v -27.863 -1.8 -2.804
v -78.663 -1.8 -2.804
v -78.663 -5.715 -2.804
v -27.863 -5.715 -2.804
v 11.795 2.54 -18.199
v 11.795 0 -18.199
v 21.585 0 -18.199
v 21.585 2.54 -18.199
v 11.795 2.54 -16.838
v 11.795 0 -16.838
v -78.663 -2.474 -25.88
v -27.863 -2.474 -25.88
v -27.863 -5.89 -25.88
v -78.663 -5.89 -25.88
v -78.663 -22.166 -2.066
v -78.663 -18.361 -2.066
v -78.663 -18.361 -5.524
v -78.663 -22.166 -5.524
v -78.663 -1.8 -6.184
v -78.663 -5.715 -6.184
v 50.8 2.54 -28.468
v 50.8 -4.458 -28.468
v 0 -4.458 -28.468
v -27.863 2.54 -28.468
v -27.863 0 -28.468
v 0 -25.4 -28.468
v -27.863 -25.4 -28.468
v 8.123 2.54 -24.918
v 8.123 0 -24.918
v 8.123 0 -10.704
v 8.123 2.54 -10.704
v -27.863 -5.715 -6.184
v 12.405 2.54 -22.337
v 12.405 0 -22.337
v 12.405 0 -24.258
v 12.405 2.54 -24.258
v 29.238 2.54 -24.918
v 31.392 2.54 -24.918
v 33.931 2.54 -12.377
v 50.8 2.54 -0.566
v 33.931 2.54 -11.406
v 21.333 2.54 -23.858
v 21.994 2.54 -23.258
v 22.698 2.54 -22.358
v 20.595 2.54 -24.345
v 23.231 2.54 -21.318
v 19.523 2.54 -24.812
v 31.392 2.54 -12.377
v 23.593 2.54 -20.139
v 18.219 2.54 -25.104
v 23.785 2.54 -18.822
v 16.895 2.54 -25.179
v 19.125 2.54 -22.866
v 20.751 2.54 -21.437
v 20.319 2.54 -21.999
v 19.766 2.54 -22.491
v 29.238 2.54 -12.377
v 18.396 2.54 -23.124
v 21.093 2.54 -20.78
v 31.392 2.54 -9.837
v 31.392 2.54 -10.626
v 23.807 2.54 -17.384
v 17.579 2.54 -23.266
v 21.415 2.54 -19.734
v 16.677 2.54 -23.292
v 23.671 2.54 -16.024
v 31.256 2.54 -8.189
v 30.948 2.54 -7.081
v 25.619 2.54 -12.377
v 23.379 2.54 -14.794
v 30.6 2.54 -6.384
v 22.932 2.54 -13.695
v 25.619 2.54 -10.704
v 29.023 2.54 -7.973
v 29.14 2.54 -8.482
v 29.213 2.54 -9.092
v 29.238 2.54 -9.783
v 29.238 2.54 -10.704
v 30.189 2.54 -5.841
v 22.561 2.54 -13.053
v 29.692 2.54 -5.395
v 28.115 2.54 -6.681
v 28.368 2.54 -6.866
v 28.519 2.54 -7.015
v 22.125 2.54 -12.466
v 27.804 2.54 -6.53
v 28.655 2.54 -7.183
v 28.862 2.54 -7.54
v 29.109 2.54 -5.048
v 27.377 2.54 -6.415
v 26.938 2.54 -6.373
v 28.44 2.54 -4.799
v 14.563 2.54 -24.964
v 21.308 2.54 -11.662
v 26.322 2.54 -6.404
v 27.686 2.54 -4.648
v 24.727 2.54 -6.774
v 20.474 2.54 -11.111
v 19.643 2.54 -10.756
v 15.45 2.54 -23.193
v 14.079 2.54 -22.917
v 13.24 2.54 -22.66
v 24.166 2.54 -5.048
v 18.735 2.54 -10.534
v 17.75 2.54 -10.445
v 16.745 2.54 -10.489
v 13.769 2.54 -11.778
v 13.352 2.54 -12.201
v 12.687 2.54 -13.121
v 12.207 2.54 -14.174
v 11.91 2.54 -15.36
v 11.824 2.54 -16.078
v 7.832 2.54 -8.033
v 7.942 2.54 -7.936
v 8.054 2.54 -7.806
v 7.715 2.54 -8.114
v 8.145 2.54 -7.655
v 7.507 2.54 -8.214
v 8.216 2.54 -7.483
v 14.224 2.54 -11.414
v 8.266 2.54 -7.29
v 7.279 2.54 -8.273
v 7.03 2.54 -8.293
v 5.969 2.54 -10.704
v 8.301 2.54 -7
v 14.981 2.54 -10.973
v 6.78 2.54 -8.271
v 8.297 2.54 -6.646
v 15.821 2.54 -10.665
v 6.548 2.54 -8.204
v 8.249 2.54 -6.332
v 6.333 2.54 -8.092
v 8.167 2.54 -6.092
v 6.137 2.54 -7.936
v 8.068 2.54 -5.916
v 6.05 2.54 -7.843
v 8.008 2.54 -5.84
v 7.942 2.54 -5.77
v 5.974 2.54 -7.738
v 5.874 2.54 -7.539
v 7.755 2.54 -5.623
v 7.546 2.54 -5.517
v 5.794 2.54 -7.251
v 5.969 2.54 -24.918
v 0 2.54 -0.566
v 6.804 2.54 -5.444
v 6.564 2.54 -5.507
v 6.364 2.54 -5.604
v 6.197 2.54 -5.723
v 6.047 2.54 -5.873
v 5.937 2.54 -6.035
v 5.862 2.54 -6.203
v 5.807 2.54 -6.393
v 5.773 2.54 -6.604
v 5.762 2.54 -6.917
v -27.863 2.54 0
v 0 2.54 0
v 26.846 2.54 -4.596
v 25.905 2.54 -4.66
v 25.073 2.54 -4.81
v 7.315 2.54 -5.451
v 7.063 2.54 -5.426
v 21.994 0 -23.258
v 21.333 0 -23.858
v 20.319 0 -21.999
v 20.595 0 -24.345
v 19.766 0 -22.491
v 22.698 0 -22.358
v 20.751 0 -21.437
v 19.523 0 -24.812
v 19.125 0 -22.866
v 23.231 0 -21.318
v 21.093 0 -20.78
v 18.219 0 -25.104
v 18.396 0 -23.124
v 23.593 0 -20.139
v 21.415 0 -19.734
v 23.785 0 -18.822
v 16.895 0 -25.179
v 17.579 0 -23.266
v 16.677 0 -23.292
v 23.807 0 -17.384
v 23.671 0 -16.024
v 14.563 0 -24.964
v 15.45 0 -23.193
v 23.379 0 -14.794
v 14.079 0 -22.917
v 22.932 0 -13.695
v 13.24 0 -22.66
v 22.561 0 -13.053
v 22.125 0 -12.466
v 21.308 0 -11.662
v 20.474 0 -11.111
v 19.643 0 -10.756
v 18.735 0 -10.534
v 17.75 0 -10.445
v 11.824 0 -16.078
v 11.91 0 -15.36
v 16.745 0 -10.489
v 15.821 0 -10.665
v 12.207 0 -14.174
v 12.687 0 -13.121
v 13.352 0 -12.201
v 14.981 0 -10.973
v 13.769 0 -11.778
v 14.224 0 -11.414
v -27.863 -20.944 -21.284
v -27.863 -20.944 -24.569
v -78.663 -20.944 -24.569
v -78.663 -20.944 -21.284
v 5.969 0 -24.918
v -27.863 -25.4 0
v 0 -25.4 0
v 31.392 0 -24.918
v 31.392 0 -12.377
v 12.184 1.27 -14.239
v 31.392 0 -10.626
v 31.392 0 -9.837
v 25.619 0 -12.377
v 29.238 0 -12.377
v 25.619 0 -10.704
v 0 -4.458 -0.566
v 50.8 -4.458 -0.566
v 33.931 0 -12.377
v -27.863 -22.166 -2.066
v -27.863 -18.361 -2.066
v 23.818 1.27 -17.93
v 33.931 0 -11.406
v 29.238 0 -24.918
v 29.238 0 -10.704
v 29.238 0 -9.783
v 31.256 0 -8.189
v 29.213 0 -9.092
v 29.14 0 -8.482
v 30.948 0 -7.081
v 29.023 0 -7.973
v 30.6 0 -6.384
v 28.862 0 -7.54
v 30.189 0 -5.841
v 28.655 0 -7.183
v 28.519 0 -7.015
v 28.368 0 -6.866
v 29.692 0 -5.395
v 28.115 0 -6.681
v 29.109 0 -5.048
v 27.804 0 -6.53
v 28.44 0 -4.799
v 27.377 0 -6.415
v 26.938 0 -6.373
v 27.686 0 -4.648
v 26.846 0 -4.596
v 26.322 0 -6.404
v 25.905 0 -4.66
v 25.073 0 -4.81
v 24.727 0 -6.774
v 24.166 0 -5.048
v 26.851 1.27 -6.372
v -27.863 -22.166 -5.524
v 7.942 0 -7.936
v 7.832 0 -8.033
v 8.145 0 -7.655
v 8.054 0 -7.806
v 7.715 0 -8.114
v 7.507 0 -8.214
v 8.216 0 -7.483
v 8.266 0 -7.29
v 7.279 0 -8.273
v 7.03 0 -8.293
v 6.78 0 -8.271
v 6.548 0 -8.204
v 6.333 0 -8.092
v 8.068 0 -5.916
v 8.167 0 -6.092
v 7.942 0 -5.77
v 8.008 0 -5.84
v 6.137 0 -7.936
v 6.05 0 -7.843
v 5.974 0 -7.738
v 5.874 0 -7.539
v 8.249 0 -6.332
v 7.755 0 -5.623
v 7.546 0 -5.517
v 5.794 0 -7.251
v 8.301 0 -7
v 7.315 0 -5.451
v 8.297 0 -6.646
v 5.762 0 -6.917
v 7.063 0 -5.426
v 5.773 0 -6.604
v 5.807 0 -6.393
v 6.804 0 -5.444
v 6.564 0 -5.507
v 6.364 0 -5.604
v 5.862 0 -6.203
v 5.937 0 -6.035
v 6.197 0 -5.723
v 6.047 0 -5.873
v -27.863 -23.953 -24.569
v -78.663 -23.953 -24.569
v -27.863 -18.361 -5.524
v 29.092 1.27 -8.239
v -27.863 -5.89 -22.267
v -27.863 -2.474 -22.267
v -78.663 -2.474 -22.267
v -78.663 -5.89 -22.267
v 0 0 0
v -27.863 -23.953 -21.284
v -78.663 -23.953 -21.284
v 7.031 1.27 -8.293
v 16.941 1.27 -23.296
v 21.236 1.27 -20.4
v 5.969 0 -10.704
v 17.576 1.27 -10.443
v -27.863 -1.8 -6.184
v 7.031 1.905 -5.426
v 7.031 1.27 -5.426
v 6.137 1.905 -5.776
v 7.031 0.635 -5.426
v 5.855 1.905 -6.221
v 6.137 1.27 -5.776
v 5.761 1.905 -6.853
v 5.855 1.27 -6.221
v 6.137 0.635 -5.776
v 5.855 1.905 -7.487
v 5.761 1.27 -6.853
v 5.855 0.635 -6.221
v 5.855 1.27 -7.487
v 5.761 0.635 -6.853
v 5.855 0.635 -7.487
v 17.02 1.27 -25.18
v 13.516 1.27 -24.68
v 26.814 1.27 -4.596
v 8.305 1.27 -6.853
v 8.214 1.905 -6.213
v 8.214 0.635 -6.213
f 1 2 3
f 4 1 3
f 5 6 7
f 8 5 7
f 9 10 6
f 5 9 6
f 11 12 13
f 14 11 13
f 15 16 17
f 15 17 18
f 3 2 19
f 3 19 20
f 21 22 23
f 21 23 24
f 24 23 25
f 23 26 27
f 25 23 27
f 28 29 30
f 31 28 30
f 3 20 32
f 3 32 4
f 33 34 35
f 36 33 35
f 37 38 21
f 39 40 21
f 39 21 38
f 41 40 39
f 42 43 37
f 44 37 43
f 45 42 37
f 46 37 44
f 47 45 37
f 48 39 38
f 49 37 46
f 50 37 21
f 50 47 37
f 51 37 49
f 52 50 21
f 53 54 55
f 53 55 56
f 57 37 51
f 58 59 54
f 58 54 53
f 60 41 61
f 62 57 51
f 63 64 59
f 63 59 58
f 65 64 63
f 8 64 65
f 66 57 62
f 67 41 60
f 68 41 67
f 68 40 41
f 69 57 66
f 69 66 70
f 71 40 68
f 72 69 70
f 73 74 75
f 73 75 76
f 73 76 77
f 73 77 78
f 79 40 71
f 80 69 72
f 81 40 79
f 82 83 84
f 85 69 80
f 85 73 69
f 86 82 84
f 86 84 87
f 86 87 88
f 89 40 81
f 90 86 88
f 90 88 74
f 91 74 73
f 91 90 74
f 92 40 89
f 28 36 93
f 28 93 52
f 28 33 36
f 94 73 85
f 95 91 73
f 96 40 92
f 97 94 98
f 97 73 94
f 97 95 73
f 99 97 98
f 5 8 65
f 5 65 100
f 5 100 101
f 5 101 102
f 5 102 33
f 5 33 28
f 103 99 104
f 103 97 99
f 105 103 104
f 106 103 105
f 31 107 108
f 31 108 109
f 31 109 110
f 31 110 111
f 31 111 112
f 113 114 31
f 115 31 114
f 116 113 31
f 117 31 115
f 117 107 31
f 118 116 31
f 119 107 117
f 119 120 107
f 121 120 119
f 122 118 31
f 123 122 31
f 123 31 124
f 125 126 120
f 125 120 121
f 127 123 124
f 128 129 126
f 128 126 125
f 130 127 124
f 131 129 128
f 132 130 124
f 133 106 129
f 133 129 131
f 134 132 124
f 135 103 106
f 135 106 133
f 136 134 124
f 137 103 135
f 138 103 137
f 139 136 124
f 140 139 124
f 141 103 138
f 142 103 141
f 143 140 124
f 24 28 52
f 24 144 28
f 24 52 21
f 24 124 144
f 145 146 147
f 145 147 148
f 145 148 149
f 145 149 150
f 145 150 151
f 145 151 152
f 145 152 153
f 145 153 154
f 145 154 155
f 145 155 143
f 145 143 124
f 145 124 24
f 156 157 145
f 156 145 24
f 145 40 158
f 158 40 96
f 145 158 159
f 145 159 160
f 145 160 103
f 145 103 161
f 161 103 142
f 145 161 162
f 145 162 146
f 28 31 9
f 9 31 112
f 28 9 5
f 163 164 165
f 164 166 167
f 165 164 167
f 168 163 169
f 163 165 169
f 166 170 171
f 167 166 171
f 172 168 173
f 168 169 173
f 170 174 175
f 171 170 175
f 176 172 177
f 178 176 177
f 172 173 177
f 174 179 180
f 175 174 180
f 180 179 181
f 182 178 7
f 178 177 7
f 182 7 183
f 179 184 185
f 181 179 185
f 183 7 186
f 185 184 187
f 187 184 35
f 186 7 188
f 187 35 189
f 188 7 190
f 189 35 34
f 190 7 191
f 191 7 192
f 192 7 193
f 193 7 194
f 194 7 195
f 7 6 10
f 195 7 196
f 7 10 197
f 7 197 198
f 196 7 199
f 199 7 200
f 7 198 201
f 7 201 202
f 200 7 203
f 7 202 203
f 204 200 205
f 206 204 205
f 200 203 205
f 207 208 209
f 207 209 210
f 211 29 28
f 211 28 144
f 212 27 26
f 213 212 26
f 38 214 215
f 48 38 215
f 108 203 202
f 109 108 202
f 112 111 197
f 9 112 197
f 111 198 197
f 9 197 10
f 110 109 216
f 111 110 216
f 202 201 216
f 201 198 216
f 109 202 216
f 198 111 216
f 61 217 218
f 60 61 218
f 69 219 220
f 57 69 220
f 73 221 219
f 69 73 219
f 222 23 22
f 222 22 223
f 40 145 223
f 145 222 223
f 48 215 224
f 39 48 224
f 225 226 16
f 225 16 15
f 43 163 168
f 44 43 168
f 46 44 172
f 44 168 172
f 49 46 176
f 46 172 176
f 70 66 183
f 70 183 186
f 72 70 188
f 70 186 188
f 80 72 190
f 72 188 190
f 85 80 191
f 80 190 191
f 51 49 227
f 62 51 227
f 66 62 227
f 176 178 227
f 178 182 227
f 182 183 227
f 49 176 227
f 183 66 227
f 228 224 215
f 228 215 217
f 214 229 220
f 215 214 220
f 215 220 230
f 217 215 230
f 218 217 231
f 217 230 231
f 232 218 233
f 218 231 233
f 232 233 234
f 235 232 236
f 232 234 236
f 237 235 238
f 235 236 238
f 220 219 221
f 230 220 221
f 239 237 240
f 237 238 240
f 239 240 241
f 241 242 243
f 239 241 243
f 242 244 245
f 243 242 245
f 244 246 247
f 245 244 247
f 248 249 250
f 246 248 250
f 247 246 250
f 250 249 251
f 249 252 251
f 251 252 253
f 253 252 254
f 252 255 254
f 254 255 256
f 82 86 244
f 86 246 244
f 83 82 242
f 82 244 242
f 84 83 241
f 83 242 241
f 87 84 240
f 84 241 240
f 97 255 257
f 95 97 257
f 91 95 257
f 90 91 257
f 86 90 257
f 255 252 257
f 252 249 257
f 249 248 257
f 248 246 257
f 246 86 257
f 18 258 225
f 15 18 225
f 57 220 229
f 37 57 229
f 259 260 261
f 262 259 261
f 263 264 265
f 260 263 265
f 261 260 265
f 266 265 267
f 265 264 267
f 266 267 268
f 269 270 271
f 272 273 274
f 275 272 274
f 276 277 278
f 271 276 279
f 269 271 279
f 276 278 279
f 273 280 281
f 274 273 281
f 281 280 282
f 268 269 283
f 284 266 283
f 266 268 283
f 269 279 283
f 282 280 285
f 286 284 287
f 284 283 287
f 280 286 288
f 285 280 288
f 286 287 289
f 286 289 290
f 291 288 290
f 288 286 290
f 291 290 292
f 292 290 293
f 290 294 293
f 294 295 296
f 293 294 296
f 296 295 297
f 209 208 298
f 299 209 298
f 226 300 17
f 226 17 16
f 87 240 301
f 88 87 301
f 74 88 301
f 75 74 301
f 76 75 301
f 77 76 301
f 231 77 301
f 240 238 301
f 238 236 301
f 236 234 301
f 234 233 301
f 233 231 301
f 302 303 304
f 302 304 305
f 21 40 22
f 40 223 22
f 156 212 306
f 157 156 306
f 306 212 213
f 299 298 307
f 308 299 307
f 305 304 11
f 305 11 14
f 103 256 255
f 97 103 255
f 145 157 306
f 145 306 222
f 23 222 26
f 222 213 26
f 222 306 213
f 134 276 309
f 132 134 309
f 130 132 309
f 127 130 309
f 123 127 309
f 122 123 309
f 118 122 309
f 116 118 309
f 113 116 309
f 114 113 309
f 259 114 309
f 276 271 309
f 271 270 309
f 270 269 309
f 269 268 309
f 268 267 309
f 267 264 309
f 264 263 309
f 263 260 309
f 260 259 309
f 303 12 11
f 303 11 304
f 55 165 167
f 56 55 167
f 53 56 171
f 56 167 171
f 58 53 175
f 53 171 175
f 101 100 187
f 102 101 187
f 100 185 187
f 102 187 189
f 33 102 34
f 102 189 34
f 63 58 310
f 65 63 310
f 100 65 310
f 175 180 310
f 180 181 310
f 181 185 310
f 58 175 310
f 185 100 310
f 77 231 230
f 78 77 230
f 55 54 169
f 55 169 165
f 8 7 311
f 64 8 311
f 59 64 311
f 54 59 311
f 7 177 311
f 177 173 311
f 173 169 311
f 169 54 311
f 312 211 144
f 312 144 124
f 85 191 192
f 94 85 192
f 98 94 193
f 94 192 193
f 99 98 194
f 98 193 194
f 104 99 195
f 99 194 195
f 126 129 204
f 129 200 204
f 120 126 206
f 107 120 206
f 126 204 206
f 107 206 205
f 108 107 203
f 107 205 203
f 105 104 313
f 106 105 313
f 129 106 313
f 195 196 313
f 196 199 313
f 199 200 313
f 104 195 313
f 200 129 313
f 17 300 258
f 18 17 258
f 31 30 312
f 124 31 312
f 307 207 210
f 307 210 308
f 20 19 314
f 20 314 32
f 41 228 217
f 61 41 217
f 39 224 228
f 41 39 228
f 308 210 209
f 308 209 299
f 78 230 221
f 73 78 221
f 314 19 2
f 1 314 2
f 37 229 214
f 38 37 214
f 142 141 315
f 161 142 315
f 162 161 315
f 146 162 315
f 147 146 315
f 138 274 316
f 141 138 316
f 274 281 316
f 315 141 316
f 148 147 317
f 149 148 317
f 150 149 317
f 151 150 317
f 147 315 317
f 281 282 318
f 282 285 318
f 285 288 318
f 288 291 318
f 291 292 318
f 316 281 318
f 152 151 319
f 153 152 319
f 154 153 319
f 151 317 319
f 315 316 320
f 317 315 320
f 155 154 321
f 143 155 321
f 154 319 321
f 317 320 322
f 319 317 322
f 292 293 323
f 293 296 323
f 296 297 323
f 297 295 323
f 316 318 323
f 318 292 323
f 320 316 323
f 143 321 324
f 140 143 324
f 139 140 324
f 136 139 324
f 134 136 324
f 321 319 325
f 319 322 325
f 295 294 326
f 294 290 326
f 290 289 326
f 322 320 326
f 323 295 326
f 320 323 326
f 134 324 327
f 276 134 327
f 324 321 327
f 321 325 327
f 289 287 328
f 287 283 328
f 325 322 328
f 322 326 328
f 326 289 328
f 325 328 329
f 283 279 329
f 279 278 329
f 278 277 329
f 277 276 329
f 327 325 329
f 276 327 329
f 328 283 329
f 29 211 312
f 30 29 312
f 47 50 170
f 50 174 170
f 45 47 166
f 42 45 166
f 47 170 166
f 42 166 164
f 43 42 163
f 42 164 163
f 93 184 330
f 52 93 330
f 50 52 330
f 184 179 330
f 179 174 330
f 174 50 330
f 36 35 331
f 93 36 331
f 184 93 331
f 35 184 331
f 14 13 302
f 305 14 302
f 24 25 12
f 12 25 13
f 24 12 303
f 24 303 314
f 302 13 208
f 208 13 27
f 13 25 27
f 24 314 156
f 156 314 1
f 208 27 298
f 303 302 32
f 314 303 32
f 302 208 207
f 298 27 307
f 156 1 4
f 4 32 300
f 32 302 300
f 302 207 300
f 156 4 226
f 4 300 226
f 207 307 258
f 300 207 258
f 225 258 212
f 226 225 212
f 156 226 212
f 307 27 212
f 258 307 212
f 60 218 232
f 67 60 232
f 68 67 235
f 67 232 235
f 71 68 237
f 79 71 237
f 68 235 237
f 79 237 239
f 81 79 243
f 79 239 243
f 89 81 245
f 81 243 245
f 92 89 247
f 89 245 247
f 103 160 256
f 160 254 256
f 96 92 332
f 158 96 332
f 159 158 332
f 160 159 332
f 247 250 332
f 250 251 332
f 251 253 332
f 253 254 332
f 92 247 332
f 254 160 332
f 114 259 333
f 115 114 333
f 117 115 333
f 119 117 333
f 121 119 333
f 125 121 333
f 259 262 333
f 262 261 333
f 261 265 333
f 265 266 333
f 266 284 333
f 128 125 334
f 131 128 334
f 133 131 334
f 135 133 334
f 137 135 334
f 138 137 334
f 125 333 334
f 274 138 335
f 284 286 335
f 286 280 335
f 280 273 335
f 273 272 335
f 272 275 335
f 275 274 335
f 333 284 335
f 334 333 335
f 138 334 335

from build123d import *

# Parameters (mm, degrees)
F0_W      = 27.8634205461
F0_H      = 28.4682586789
F1_DEPTH  = 25.4
F2_W      = 3.9148032665
F2_H      = 3.3797924407
F3_DEPTH  = 50.8
F4_W      = 3.8050059229
F4_H      = 3.4576065373
F5_DEPTH  = 50.8
F6_W      = 3.416453721
F6_H      = 3.6132577807
F7_DEPTH  = 50.8
F9_W      = 3.0085314065
F9_H      = 3.2848082483
F10_DEPTH = 50.8
F8_W      = 4.4579515234
F8_H      = 27.902291331
F11_DEPTH = 50.8
F12_W     = 2.1538413306
F12_H     = 14.2136927884
F13_DEPTH = 2.54


with BuildPart() as f1:
    # F0 (on Front) → F1 (new body)
    with BuildSketch(Plane.XZ):
        with Locations((-13.931710273, -14.2341293395)):
            Rectangle(F0_W, F0_H)
    extrude(amount=F1_DEPTH)

    # F2 (on face) → F3 (join)
    with BuildSketch(Plane(origin=(-27.8634205461, 0, 0), x_dir=(0, -1, 0), z_dir=(-1, 0, 0))):
        with Locations((3.7574605085, -4.493831424)):
            Rectangle(F2_W, F2_H)
    extrude(amount=F3_DEPTH)

    # F4 (on face) → F5 (join)
    with BuildSketch(Plane(origin=(-27.8634205461, 0, 0), x_dir=(0, -1, 0), z_dir=(-1, 0, 0))):
        with Locations((20.2637864277, -3.7950236583)):
            Rectangle(F4_W, F4_H)
    extrude(amount=F5_DEPTH)

    # F6 (on face) → F7 (join)
    with BuildSketch(Plane(origin=(-27.8634205461, 0, 0), x_dir=(0, -1, 0), z_dir=(-1, 0, 0))):
        with Locations((4.1821881896, -24.0737376735)):
            Rectangle(F6_W, F6_H)
    extrude(amount=F7_DEPTH)

    # F9 (on face) → F10 (join)
    with BuildSketch(Plane(origin=(-27.8634205461, 0, 0), x_dir=(0, -1, 0), z_dir=(-1, 0, 0))):
        with Locations((22.4483674392, -22.9268092662)):
            Rectangle(F9_W, F9_H)
    extrude(amount=F10_DEPTH)

    # F8 (on face) → F11 (join)
    with BuildSketch(Plane.YZ):
        with Locations((-2.2289757617, -14.5171130134)):
            Rectangle(F8_W, F8_H)
    extrude(amount=F11_DEPTH)

    # F12 (on face) → F13 (join)
    with BuildSketch(Plane(origin=(0, 0, 0), x_dir=(-1, 0, 0), z_dir=(0, 1, 0))):
        Polygon((27.8634205461, 0), (0, 0), (0, -0.5659673479), (-50.8, -0.5659673479), (-50.8, -28.4682586789), (27.8634205461, -28.4682586789), align=None)
        with BuildLine():
            add(Edge.make_bspline(
                [(-14.5633904309, -24.9638148742), (-15.5801363384, -25.1796140055), (-17.0201805421, -25.1796140055)],
                knots=[0, 0, 0, 1, 1, 1], degree=2))
            add(Edge.make_bspline(
                [(-17.0201805421, -25.1796140055), (-20.1700178637, -25.1796140055), (-21.9939355222, -23.2581717395)],
                knots=[0, 0, 0, 1, 1, 1], degree=2))
            add(Edge.make_bspline(
                [(-21.9939355222, -23.2581717395), (-23.8178531807, -21.3367294736), (-23.8178531807, -17.9295931876)],
                knots=[0, 0, 0, 1, 1, 1], degree=2))
            add(Edge.make_bspline(
                [(-23.8178531807, -17.9295931876), (-23.8178531807, -14.4892570354), (-22.124659996, -12.4661401786)],
                knots=[0, 0, 0, 1, 1, 1], degree=2))
            add(Edge.make_bspline(
                [(-22.124659996, -12.4661401786), (-20.4314668113, -10.4430233219), (-17.5762783037, -10.4430233219)],
                knots=[0, 0, 0, 1, 1, 1], degree=2))
            add(Edge.make_bspline(
                [(-17.5762783037, -10.4430233219), (-14.9078390445, -10.4430233219), (-13.3515953086, -12.2005412477)],
                knots=[0, 0, 0, 1, 1, 1], degree=2))
            add(Edge.make_bspline(
                [(-13.3515953086, -12.2005412477), (-11.7953515726, -13.9580591735), (-11.7953515726, -16.8381475808)],
                knots=[0, 0, 0, 1, 1, 1], degree=2))
            Line((-11.7953515726, -16.8381475808), (-11.7953515726, -18.1993421019))
            Line((-11.7953515726, -18.1993421019), (-21.5851621676, -18.1993421019))
            add(Edge.make_bspline(
                [(-21.5851621676, -18.1993421019), (-21.5187624348, -20.7017820293), (-20.3194172623, -21.9986518093)],
                knots=[0, 0, 0, 1, 1, 1], degree=2))
            add(Edge.make_bspline(
                [(-20.3194172623, -21.9986518093), (-19.1200720898, -23.2955215892), (-16.9413308595, -23.2955215892)],
                knots=[0, 0, 0, 1, 1, 1], degree=2))
            add(Edge.make_bspline(
                [(-16.9413308595, -23.2955215892), (-14.6463900969, -23.2955215892), (-12.4053991171, -22.3368754479)],
                knots=[0, 0, 0, 1, 1, 1], degree=2))
            Line((-12.4053991171, -22.3368754479), (-12.4053991171, -24.2583177139))
            add(Edge.make_bspline(
                [(-12.4053991171, -24.2583177139), (-13.5466445235, -24.7480157428), (-14.5633904309, -24.9638148742)],
                knots=[0, 0, 0, 1, 1, 1], degree=2))
        make_face(mode=Mode.SUBTRACT)
        with BuildLine():
            Line((-25.6189459312, -10.7044722695), (-25.6189459312, -12.3769155378))
            Line((-25.6189459312, -12.3769155378), (-29.2377313652, -12.3769155378))
            Line((-29.2377313652, -12.3769155378), (-29.2377313652, -24.9181650579))
            Line((-29.2377313652, -24.9181650579), (-31.3915726957, -24.9181650579))
            Line((-31.3915726957, -24.9181650579), (-31.3915726957, -12.3769155378))
            Line((-31.3915726957, -12.3769155378), (-33.9313624728, -12.3769155378))
            Line((-33.9313624728, -12.3769155378), (-33.9313624728, -11.4058194465))
            Line((-33.9313624728, -11.4058194465), (-31.3915726957, -10.6256225869))
            Line((-31.3915726957, -10.6256225869), (-31.3915726957, -9.8371257607))
            add(Edge.make_bspline(
                [(-31.3915726957, -9.8371257607), (-31.3915726957, -4.595696858), (-26.8141411204, -4.595696858)],
                knots=[0, 0, 0, 1, 1, 1], degree=2))
            add(Edge.make_bspline(
                [(-26.8141411204, -4.595696858), (-25.6853456639, -4.595696858), (-24.1664517776, -5.0480450373)],
                knots=[0, 0, 0, 1, 1, 1], degree=2))
            Line((-24.1664517776, -5.0480450373), (-24.7266995225, -6.7744380883))
            add(Edge.make_bspline(
                [(-24.7266995225, -6.7744380883), (-25.9716945113, -6.3718897086), (-26.85149097, -6.3718897086)],
                knots=[0, 0, 0, 1, 1, 1], degree=2))
            add(Edge.make_bspline(
                [(-26.85149097, -6.3718897086), (-28.071586059, -6.3718897086), (-28.6546587121, -7.183211443)],
                knots=[0, 0, 0, 1, 1, 1], degree=2))
            add(Edge.make_bspline(
                [(-28.6546587121, -7.183211443), (-29.2377313652, -7.9945331773), (-29.2377313652, -9.7831759778)],
                knots=[0, 0, 0, 1, 1, 1], degree=2))
            Line((-29.2377313652, -9.7831759778), (-29.2377313652, -10.7044722695))
            Line((-29.2377313652, -10.7044722695), (-25.6189459312, -10.7044722695))
        make_face(mode=Mode.SUBTRACT)
        with Locations((-7.0456956905, -17.8113186637)):
            Rectangle(F12_W, F12_H, mode=Mode.SUBTRACT)
        with BuildLine():
            add(Edge.make_bspline(
                [(-7.9420920824, -7.9364334112), (-8.3052156208, -7.5795348477), (-8.3052156208, -6.853287771)],
                knots=[0, 0, 0, 1, 1, 1], degree=2))
            add(Edge.make_bspline(
                [(-8.3052156208, -6.853287771), (-8.3052156208, -6.1145907443), (-7.9420920824, -5.7701421307)],
                knots=[0, 0, 0, 1, 1, 1], degree=2))
            add(Edge.make_bspline(
                [(-7.9420920824, -5.7701421307), (-7.578968544, -5.4256935172), (-7.0311707489, -5.4256935172)],
                knots=[0, 0, 0, 1, 1, 1], degree=2))
            add(Edge.make_bspline(
                [(-7.0311707489, -5.4256935172), (-6.512422837, -5.4256935172), (-6.1368493487, -5.7763671057)],
                knots=[0, 0, 0, 1, 1, 1], degree=2))
            add(Edge.make_bspline(
                [(-6.1368493487, -5.7763671057), (-5.7612758604, -6.1270406942), (-5.7612758604, -6.853287771)],
                knots=[0, 0, 0, 1, 1, 1], degree=2))
            add(Edge.make_bspline(
                [(-5.7612758604, -6.853287771), (-5.7612758604, -7.5795348477), (-6.1368493487, -7.9364334112)],
                knots=[0, 0, 0, 1, 1, 1], degree=2))
            add(Edge.make_bspline(
                [(-6.1368493487, -7.9364334112), (-6.512422837, -8.2933319746), (-7.0311707489, -8.2933319746)],
                knots=[0, 0, 0, 1, 1, 1], degree=2))
            add(Edge.make_bspline(
                [(-7.0311707489, -8.2933319746), (-7.578968544, -8.2933319746), (-7.9420920824, -7.9364334112)],
                knots=[0, 0, 0, 1, 1, 1], degree=2))
        make_face(mode=Mode.SUBTRACT)
    extrude(amount=F13_DEPTH)


solid = f1.part
